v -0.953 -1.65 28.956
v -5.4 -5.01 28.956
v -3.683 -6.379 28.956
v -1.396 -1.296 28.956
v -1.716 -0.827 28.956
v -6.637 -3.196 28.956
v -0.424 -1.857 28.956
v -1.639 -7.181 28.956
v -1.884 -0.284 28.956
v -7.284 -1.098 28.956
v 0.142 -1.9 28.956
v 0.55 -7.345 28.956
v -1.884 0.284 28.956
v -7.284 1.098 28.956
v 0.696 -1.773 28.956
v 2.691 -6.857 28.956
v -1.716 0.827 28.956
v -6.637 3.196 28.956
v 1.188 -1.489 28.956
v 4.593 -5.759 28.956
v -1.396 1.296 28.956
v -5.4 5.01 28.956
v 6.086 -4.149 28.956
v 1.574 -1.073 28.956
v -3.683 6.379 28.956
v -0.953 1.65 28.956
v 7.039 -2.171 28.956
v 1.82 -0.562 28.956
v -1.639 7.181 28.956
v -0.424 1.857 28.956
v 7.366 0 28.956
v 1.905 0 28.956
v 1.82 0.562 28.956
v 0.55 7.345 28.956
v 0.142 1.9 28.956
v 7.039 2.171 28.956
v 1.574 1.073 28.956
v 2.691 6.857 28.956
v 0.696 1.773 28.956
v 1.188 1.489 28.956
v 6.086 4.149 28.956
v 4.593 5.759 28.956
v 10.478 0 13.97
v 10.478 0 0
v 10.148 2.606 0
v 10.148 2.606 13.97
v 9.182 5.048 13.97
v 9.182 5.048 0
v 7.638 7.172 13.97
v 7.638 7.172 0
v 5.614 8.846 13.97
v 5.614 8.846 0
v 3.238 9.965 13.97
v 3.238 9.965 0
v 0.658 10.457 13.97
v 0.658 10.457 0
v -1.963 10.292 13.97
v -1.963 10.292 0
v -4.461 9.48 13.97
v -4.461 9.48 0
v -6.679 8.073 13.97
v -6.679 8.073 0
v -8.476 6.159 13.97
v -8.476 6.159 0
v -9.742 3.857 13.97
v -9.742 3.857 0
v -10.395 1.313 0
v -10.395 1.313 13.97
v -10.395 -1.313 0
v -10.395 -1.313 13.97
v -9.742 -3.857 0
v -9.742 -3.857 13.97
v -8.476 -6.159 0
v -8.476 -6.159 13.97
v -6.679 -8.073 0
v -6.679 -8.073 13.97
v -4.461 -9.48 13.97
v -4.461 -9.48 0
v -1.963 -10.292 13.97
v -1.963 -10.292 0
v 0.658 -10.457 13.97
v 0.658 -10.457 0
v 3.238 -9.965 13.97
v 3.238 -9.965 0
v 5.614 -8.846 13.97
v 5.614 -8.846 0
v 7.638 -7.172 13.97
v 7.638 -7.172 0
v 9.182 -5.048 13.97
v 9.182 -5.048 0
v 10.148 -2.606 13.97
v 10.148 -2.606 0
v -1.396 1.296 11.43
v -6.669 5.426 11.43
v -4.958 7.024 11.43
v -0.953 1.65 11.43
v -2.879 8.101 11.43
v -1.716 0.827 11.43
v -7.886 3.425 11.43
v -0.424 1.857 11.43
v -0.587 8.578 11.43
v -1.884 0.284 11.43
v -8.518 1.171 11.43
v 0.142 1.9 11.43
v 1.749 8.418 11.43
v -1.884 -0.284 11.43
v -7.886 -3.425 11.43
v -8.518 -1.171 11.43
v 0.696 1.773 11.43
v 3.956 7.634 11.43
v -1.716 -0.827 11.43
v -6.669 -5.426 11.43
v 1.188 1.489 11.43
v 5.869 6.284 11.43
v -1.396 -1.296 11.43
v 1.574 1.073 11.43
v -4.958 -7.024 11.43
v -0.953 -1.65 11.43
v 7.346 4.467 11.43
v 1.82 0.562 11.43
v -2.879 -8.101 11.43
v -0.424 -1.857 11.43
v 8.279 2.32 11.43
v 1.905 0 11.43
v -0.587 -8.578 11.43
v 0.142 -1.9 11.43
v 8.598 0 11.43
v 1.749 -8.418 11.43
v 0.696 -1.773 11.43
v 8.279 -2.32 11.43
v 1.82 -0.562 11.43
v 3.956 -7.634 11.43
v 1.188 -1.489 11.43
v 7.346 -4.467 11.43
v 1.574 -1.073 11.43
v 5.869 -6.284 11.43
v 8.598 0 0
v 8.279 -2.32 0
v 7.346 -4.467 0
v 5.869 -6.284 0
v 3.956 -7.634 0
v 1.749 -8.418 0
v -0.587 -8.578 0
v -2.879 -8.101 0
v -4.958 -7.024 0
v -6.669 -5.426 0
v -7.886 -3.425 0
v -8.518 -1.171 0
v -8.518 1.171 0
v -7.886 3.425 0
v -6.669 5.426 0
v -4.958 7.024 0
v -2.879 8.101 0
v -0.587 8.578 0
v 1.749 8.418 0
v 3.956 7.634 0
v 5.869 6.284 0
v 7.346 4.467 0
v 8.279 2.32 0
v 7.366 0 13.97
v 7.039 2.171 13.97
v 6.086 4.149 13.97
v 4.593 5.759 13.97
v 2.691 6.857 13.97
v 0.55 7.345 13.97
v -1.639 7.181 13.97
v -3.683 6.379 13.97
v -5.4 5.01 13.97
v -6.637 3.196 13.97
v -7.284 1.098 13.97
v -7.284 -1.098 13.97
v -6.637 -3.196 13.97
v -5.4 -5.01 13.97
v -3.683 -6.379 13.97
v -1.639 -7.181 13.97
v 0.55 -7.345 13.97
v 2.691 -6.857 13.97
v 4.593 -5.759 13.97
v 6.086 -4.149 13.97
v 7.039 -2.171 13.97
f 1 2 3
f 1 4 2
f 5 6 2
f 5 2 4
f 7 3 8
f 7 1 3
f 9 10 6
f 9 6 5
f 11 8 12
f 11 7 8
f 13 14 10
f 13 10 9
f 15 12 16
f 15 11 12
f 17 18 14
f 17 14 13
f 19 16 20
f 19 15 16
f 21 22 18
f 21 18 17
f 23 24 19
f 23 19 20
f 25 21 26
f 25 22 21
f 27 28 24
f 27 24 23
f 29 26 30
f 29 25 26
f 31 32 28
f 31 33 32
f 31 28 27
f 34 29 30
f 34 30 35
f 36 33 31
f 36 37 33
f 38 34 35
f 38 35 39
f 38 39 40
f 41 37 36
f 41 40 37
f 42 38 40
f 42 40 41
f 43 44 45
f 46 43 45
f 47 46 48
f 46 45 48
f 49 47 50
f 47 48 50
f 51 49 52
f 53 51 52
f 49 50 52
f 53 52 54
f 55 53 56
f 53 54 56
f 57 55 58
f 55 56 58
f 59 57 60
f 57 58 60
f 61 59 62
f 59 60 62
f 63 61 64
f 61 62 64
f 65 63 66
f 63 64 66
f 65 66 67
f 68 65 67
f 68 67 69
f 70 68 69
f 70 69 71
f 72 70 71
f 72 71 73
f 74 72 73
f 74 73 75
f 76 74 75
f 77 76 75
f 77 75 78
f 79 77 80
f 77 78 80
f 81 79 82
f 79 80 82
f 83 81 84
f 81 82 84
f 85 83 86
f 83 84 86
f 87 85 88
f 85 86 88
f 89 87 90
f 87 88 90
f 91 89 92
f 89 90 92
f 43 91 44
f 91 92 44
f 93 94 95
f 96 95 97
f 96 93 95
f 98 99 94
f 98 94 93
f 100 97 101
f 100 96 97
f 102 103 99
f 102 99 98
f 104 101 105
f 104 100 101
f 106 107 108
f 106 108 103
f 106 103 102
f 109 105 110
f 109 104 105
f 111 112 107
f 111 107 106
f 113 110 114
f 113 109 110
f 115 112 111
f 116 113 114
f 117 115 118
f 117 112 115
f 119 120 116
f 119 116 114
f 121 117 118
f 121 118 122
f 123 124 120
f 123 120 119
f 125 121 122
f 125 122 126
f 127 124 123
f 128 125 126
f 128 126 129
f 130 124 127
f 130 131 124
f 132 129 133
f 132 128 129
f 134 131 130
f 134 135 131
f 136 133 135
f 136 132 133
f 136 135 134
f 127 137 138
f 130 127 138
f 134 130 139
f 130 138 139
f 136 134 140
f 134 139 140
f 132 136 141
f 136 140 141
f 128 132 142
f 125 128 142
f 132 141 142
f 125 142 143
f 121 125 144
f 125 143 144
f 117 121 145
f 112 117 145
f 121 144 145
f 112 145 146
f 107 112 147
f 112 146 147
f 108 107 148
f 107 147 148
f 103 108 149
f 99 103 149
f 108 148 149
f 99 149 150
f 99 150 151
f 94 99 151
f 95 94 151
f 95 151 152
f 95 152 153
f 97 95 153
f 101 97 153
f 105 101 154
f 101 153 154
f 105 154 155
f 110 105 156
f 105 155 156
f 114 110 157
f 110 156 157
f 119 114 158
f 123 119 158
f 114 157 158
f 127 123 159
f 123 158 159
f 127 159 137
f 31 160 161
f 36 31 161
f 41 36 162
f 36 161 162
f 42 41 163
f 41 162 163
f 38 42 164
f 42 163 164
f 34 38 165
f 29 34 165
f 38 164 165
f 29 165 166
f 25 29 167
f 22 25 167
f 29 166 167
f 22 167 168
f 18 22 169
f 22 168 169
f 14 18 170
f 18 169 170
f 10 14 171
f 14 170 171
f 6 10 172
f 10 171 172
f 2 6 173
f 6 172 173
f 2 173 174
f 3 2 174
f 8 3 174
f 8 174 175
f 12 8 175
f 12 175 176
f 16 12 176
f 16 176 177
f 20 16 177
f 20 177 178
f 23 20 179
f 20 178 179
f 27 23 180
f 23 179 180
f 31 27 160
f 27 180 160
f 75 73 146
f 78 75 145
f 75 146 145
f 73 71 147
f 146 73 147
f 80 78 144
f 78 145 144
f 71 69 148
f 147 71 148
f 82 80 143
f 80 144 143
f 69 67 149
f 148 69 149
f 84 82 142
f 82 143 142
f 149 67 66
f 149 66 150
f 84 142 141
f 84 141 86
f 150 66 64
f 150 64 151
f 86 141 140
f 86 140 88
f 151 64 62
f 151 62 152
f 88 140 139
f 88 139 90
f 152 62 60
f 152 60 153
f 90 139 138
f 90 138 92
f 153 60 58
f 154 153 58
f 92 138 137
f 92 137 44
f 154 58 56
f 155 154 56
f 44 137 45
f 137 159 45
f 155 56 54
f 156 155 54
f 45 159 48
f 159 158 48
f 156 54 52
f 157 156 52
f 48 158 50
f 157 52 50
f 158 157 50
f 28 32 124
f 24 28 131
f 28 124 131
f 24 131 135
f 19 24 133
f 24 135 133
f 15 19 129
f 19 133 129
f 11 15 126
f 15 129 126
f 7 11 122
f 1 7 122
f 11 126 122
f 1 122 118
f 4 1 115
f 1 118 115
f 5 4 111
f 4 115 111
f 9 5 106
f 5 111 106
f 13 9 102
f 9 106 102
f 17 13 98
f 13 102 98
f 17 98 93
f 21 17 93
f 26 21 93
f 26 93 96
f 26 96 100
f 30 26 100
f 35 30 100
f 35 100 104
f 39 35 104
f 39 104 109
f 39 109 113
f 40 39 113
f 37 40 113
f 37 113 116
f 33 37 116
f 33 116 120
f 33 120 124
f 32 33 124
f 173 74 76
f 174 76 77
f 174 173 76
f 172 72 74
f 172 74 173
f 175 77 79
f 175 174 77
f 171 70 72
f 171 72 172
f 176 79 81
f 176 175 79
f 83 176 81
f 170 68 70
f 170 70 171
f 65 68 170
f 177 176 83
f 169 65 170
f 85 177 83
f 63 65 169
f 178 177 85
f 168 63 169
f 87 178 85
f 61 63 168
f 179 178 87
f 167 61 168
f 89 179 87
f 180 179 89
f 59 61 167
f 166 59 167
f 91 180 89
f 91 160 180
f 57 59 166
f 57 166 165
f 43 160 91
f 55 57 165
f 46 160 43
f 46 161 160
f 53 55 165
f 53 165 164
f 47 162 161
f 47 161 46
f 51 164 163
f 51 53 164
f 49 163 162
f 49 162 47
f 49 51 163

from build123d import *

# Parameters (mm, degrees)
F0_R     = 10.4775
F1_DEPTH = 13.97
F2_R     = 7.366
F3_DEPTH = 14.986
F4_R     = 8.5979
F5_DEPTH = 11.43
F6_R     = 1.905
F7_DEPTH = 17.78


with BuildPart() as f1:
    # F0 (on Top) → F1 (new body)
    with BuildSketch(Plane.XY):
        Circle(F0_R)
    extrude(amount=F1_DEPTH)

    # F2 (on face) → F3 (join)
    with BuildSketch(Plane.XY.offset(13.97)):
        Circle(F2_R)
    extrude(amount=F3_DEPTH)

    # F4 (on face) → F5 (cut)
    with BuildSketch(Plane(origin=(0, 0, 0), x_dir=(1, 0, 0), z_dir=(0, 0, -1))):
        Circle(F4_R)
    extrude(amount=-F5_DEPTH, mode=Mode.SUBTRACT)

    # F6 (on face) → F7 (cut)
    with BuildSketch(Plane(origin=(0, 0, 11.43), x_dir=(1, 0, 0), z_dir=(0, 0, -1))):
        Circle(F6_R)
    extrude(amount=-F7_DEPTH, mode=Mode.SUBTRACT)


solid = f1.part
